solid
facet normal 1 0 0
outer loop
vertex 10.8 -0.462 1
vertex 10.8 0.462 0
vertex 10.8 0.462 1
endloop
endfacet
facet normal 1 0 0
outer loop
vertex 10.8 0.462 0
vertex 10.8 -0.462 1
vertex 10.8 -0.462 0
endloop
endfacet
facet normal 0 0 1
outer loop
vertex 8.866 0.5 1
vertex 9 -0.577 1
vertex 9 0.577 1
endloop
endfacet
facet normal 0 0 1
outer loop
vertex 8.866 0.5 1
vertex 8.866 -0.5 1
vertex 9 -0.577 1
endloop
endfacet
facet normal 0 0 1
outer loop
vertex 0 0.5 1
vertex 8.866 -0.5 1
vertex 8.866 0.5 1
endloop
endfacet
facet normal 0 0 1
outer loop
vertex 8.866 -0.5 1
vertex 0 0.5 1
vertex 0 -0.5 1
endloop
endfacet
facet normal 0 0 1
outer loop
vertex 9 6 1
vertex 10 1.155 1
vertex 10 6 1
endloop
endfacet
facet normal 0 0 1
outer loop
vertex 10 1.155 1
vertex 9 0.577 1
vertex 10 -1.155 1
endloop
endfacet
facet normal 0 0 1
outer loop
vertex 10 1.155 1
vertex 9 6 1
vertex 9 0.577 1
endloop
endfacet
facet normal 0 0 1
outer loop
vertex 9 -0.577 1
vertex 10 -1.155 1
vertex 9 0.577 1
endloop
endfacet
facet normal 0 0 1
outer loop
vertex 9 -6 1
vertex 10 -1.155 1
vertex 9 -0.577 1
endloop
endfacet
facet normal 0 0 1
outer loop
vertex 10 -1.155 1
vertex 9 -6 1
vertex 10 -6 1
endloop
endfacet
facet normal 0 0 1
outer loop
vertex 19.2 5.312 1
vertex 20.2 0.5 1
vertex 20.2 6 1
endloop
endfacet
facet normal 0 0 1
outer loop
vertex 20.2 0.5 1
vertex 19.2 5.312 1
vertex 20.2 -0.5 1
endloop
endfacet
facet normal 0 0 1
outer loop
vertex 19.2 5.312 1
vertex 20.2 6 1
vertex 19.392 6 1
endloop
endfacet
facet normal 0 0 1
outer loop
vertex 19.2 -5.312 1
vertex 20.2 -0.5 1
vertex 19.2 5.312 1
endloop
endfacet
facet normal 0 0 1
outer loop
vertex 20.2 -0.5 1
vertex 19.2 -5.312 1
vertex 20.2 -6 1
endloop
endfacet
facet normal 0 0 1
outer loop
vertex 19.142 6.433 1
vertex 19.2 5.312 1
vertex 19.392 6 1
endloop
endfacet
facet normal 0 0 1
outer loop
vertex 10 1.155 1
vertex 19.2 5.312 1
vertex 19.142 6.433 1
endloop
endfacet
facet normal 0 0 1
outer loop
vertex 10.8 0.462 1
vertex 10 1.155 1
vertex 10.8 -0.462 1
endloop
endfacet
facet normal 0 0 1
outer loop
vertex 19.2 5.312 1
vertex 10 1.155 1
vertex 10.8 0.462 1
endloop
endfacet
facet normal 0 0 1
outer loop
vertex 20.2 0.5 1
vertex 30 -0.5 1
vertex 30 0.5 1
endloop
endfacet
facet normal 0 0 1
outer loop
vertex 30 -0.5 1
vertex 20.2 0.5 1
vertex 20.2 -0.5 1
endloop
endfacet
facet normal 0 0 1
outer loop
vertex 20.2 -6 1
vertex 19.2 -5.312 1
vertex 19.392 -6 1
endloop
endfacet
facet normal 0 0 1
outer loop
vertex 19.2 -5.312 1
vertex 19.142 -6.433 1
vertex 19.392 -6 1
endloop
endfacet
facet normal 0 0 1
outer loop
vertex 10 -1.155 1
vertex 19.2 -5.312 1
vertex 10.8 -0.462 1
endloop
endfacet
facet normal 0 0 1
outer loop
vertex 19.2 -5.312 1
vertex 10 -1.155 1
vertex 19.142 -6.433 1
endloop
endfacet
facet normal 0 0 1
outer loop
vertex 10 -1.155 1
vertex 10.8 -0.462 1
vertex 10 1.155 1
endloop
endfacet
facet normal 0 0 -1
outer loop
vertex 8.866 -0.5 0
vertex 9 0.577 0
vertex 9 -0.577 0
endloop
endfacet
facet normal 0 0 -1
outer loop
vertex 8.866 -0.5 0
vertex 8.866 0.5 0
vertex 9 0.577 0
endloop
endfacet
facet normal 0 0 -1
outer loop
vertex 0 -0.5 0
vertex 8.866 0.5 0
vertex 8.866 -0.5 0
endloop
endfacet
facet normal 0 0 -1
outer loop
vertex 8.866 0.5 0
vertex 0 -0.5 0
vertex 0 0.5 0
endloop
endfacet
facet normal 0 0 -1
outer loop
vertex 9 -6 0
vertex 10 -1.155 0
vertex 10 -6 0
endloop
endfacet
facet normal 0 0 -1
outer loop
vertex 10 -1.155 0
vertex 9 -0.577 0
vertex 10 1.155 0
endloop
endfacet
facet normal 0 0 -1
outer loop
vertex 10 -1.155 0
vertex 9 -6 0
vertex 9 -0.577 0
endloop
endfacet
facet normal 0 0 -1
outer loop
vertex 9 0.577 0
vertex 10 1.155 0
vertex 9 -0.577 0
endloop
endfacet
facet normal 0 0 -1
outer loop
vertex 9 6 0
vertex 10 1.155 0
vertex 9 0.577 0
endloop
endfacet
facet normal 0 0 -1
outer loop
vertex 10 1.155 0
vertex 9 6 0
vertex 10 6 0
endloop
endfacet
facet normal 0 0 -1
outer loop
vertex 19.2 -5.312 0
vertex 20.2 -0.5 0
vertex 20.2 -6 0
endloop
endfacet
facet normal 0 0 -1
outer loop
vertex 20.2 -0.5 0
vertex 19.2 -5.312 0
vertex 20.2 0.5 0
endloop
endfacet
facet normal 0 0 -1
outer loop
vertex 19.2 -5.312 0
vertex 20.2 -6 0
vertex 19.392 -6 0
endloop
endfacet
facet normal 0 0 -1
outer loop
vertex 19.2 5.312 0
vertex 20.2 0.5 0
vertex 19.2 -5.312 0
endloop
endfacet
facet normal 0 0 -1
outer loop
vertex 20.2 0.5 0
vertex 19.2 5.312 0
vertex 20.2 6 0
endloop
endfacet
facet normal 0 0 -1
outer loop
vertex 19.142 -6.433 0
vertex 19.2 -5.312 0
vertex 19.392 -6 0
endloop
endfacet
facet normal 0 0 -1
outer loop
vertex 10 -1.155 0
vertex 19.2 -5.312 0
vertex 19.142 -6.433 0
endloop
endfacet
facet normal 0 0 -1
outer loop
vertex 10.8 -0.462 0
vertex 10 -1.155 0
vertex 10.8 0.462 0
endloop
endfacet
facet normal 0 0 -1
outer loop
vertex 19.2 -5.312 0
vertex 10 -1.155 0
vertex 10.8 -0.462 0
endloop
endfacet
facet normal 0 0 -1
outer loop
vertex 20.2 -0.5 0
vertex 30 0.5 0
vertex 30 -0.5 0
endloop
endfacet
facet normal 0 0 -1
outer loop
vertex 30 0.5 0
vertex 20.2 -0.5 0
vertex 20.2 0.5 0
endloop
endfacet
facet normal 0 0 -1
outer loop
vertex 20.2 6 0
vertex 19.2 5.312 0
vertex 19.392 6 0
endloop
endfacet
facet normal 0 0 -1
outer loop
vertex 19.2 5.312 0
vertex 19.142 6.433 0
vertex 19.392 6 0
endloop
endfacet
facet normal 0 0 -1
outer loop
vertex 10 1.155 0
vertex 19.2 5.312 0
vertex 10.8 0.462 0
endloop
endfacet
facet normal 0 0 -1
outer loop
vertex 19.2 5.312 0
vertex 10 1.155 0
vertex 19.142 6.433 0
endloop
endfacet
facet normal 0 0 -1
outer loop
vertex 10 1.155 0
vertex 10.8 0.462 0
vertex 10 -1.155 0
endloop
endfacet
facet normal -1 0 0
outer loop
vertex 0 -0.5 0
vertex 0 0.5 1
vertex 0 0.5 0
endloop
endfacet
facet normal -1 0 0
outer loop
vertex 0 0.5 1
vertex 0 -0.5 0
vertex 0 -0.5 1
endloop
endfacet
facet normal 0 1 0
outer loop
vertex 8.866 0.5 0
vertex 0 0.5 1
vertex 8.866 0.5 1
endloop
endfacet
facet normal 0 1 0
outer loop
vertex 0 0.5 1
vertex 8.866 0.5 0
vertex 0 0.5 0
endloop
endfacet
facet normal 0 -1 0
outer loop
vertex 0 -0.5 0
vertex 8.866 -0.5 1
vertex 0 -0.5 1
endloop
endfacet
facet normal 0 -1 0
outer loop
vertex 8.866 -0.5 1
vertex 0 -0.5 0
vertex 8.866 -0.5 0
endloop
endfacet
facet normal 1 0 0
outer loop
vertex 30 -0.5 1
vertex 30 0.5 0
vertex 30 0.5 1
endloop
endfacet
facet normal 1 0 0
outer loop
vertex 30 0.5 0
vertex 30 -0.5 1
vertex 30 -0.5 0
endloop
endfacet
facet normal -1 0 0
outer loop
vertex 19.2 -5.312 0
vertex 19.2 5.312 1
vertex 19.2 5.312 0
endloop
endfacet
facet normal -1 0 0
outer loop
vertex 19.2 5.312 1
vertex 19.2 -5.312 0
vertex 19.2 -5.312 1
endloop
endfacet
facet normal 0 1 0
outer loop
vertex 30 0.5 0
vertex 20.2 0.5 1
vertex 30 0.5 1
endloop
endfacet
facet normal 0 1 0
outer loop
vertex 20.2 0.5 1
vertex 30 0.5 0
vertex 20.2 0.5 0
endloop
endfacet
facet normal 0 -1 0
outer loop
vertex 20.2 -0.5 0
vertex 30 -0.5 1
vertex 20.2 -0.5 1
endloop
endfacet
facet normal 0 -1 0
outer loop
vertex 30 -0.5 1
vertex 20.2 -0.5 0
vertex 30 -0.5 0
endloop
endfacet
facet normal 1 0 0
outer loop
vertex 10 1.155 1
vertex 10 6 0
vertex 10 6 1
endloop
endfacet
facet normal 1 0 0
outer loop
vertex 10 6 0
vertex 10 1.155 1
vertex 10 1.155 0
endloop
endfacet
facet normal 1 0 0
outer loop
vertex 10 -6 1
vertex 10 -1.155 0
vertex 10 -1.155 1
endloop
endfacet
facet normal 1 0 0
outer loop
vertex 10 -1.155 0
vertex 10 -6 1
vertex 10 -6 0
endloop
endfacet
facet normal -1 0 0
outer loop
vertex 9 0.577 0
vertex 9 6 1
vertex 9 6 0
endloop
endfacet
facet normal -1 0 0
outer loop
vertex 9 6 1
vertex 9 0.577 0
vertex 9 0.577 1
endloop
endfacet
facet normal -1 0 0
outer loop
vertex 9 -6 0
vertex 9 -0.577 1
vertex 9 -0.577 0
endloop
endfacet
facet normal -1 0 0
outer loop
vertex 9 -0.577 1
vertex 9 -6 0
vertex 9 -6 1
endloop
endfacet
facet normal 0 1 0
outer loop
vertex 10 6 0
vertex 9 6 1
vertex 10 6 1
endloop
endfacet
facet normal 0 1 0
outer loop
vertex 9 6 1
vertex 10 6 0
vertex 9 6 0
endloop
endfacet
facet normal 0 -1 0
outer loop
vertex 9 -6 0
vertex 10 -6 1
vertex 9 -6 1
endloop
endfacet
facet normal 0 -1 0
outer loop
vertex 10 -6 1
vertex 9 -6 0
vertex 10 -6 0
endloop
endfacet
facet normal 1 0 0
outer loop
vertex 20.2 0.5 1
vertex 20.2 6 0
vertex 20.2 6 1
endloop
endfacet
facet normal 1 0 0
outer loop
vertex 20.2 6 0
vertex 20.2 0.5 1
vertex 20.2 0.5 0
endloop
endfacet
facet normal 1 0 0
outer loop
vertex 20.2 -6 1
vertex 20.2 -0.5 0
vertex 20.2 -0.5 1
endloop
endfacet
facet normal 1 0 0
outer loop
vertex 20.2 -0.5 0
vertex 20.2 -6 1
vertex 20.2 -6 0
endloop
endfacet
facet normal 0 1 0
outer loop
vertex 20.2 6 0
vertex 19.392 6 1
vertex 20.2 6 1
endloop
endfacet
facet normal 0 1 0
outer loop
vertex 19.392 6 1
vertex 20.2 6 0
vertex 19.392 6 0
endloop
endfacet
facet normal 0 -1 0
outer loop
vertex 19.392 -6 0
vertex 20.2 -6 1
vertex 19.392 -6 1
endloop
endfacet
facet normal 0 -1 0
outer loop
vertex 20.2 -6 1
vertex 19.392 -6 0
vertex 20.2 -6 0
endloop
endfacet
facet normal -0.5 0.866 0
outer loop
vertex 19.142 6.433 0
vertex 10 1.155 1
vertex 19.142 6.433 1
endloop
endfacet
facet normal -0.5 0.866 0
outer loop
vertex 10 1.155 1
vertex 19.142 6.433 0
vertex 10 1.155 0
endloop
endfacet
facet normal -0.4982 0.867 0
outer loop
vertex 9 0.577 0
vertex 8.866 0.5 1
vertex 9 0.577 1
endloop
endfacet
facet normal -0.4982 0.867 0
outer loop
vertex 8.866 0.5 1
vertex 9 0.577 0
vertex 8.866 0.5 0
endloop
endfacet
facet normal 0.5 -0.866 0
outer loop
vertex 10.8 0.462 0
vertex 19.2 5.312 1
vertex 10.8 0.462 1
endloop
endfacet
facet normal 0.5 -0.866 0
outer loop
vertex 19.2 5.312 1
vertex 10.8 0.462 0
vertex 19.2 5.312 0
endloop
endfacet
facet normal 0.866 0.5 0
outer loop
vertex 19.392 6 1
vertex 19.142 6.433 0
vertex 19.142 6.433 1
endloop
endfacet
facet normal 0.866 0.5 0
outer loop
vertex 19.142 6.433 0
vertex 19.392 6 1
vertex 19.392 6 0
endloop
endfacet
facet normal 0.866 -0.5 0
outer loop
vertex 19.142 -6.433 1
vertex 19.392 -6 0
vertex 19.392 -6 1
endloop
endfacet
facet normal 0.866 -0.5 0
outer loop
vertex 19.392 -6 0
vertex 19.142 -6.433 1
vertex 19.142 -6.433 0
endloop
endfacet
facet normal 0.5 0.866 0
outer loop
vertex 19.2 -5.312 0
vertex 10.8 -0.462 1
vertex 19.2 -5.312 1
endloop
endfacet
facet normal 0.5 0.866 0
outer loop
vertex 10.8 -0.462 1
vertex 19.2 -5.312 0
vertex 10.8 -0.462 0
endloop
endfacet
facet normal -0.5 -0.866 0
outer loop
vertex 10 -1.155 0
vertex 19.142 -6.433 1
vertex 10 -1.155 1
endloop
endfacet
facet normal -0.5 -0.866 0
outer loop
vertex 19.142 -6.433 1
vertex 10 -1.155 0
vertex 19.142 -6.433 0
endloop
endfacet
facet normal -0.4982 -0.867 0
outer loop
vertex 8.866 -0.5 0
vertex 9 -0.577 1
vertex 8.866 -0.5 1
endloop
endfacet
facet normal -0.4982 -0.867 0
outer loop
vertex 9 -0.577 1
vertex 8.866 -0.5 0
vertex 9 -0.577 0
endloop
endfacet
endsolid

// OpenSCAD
module diode(length, width, thickness, height)
{
    translate([0,-thickness/2,0])cube([(length-width*0.7)/2, thickness, height]);
    translate([(length+width*0.7)/2,-thickness/2,0])cube([(length-width*0.7)/2, thickness, height]);
    
    translate([(length-width)/2,-width/2, 0])cube([thickness, width, height]);
    translate([(length+width*0.7)/2,-width/2, 0])cube([thickness, width, height]);
    //translate([(length+width)/2,-thickness/2,0])cube([(length-width)/2, thickness, height]);
    translate([(length-width)/2,0,0])rotate([0,0,30])translate([0,-thickness/2,0])cube([width, thickness, height]);
    translate([(length-width)/2,0,0])rotate([0,0,-30])translate([0,-thickness/2,0])cube([width, thickness, height]);
}

diode(30, 12, 1, 1);
